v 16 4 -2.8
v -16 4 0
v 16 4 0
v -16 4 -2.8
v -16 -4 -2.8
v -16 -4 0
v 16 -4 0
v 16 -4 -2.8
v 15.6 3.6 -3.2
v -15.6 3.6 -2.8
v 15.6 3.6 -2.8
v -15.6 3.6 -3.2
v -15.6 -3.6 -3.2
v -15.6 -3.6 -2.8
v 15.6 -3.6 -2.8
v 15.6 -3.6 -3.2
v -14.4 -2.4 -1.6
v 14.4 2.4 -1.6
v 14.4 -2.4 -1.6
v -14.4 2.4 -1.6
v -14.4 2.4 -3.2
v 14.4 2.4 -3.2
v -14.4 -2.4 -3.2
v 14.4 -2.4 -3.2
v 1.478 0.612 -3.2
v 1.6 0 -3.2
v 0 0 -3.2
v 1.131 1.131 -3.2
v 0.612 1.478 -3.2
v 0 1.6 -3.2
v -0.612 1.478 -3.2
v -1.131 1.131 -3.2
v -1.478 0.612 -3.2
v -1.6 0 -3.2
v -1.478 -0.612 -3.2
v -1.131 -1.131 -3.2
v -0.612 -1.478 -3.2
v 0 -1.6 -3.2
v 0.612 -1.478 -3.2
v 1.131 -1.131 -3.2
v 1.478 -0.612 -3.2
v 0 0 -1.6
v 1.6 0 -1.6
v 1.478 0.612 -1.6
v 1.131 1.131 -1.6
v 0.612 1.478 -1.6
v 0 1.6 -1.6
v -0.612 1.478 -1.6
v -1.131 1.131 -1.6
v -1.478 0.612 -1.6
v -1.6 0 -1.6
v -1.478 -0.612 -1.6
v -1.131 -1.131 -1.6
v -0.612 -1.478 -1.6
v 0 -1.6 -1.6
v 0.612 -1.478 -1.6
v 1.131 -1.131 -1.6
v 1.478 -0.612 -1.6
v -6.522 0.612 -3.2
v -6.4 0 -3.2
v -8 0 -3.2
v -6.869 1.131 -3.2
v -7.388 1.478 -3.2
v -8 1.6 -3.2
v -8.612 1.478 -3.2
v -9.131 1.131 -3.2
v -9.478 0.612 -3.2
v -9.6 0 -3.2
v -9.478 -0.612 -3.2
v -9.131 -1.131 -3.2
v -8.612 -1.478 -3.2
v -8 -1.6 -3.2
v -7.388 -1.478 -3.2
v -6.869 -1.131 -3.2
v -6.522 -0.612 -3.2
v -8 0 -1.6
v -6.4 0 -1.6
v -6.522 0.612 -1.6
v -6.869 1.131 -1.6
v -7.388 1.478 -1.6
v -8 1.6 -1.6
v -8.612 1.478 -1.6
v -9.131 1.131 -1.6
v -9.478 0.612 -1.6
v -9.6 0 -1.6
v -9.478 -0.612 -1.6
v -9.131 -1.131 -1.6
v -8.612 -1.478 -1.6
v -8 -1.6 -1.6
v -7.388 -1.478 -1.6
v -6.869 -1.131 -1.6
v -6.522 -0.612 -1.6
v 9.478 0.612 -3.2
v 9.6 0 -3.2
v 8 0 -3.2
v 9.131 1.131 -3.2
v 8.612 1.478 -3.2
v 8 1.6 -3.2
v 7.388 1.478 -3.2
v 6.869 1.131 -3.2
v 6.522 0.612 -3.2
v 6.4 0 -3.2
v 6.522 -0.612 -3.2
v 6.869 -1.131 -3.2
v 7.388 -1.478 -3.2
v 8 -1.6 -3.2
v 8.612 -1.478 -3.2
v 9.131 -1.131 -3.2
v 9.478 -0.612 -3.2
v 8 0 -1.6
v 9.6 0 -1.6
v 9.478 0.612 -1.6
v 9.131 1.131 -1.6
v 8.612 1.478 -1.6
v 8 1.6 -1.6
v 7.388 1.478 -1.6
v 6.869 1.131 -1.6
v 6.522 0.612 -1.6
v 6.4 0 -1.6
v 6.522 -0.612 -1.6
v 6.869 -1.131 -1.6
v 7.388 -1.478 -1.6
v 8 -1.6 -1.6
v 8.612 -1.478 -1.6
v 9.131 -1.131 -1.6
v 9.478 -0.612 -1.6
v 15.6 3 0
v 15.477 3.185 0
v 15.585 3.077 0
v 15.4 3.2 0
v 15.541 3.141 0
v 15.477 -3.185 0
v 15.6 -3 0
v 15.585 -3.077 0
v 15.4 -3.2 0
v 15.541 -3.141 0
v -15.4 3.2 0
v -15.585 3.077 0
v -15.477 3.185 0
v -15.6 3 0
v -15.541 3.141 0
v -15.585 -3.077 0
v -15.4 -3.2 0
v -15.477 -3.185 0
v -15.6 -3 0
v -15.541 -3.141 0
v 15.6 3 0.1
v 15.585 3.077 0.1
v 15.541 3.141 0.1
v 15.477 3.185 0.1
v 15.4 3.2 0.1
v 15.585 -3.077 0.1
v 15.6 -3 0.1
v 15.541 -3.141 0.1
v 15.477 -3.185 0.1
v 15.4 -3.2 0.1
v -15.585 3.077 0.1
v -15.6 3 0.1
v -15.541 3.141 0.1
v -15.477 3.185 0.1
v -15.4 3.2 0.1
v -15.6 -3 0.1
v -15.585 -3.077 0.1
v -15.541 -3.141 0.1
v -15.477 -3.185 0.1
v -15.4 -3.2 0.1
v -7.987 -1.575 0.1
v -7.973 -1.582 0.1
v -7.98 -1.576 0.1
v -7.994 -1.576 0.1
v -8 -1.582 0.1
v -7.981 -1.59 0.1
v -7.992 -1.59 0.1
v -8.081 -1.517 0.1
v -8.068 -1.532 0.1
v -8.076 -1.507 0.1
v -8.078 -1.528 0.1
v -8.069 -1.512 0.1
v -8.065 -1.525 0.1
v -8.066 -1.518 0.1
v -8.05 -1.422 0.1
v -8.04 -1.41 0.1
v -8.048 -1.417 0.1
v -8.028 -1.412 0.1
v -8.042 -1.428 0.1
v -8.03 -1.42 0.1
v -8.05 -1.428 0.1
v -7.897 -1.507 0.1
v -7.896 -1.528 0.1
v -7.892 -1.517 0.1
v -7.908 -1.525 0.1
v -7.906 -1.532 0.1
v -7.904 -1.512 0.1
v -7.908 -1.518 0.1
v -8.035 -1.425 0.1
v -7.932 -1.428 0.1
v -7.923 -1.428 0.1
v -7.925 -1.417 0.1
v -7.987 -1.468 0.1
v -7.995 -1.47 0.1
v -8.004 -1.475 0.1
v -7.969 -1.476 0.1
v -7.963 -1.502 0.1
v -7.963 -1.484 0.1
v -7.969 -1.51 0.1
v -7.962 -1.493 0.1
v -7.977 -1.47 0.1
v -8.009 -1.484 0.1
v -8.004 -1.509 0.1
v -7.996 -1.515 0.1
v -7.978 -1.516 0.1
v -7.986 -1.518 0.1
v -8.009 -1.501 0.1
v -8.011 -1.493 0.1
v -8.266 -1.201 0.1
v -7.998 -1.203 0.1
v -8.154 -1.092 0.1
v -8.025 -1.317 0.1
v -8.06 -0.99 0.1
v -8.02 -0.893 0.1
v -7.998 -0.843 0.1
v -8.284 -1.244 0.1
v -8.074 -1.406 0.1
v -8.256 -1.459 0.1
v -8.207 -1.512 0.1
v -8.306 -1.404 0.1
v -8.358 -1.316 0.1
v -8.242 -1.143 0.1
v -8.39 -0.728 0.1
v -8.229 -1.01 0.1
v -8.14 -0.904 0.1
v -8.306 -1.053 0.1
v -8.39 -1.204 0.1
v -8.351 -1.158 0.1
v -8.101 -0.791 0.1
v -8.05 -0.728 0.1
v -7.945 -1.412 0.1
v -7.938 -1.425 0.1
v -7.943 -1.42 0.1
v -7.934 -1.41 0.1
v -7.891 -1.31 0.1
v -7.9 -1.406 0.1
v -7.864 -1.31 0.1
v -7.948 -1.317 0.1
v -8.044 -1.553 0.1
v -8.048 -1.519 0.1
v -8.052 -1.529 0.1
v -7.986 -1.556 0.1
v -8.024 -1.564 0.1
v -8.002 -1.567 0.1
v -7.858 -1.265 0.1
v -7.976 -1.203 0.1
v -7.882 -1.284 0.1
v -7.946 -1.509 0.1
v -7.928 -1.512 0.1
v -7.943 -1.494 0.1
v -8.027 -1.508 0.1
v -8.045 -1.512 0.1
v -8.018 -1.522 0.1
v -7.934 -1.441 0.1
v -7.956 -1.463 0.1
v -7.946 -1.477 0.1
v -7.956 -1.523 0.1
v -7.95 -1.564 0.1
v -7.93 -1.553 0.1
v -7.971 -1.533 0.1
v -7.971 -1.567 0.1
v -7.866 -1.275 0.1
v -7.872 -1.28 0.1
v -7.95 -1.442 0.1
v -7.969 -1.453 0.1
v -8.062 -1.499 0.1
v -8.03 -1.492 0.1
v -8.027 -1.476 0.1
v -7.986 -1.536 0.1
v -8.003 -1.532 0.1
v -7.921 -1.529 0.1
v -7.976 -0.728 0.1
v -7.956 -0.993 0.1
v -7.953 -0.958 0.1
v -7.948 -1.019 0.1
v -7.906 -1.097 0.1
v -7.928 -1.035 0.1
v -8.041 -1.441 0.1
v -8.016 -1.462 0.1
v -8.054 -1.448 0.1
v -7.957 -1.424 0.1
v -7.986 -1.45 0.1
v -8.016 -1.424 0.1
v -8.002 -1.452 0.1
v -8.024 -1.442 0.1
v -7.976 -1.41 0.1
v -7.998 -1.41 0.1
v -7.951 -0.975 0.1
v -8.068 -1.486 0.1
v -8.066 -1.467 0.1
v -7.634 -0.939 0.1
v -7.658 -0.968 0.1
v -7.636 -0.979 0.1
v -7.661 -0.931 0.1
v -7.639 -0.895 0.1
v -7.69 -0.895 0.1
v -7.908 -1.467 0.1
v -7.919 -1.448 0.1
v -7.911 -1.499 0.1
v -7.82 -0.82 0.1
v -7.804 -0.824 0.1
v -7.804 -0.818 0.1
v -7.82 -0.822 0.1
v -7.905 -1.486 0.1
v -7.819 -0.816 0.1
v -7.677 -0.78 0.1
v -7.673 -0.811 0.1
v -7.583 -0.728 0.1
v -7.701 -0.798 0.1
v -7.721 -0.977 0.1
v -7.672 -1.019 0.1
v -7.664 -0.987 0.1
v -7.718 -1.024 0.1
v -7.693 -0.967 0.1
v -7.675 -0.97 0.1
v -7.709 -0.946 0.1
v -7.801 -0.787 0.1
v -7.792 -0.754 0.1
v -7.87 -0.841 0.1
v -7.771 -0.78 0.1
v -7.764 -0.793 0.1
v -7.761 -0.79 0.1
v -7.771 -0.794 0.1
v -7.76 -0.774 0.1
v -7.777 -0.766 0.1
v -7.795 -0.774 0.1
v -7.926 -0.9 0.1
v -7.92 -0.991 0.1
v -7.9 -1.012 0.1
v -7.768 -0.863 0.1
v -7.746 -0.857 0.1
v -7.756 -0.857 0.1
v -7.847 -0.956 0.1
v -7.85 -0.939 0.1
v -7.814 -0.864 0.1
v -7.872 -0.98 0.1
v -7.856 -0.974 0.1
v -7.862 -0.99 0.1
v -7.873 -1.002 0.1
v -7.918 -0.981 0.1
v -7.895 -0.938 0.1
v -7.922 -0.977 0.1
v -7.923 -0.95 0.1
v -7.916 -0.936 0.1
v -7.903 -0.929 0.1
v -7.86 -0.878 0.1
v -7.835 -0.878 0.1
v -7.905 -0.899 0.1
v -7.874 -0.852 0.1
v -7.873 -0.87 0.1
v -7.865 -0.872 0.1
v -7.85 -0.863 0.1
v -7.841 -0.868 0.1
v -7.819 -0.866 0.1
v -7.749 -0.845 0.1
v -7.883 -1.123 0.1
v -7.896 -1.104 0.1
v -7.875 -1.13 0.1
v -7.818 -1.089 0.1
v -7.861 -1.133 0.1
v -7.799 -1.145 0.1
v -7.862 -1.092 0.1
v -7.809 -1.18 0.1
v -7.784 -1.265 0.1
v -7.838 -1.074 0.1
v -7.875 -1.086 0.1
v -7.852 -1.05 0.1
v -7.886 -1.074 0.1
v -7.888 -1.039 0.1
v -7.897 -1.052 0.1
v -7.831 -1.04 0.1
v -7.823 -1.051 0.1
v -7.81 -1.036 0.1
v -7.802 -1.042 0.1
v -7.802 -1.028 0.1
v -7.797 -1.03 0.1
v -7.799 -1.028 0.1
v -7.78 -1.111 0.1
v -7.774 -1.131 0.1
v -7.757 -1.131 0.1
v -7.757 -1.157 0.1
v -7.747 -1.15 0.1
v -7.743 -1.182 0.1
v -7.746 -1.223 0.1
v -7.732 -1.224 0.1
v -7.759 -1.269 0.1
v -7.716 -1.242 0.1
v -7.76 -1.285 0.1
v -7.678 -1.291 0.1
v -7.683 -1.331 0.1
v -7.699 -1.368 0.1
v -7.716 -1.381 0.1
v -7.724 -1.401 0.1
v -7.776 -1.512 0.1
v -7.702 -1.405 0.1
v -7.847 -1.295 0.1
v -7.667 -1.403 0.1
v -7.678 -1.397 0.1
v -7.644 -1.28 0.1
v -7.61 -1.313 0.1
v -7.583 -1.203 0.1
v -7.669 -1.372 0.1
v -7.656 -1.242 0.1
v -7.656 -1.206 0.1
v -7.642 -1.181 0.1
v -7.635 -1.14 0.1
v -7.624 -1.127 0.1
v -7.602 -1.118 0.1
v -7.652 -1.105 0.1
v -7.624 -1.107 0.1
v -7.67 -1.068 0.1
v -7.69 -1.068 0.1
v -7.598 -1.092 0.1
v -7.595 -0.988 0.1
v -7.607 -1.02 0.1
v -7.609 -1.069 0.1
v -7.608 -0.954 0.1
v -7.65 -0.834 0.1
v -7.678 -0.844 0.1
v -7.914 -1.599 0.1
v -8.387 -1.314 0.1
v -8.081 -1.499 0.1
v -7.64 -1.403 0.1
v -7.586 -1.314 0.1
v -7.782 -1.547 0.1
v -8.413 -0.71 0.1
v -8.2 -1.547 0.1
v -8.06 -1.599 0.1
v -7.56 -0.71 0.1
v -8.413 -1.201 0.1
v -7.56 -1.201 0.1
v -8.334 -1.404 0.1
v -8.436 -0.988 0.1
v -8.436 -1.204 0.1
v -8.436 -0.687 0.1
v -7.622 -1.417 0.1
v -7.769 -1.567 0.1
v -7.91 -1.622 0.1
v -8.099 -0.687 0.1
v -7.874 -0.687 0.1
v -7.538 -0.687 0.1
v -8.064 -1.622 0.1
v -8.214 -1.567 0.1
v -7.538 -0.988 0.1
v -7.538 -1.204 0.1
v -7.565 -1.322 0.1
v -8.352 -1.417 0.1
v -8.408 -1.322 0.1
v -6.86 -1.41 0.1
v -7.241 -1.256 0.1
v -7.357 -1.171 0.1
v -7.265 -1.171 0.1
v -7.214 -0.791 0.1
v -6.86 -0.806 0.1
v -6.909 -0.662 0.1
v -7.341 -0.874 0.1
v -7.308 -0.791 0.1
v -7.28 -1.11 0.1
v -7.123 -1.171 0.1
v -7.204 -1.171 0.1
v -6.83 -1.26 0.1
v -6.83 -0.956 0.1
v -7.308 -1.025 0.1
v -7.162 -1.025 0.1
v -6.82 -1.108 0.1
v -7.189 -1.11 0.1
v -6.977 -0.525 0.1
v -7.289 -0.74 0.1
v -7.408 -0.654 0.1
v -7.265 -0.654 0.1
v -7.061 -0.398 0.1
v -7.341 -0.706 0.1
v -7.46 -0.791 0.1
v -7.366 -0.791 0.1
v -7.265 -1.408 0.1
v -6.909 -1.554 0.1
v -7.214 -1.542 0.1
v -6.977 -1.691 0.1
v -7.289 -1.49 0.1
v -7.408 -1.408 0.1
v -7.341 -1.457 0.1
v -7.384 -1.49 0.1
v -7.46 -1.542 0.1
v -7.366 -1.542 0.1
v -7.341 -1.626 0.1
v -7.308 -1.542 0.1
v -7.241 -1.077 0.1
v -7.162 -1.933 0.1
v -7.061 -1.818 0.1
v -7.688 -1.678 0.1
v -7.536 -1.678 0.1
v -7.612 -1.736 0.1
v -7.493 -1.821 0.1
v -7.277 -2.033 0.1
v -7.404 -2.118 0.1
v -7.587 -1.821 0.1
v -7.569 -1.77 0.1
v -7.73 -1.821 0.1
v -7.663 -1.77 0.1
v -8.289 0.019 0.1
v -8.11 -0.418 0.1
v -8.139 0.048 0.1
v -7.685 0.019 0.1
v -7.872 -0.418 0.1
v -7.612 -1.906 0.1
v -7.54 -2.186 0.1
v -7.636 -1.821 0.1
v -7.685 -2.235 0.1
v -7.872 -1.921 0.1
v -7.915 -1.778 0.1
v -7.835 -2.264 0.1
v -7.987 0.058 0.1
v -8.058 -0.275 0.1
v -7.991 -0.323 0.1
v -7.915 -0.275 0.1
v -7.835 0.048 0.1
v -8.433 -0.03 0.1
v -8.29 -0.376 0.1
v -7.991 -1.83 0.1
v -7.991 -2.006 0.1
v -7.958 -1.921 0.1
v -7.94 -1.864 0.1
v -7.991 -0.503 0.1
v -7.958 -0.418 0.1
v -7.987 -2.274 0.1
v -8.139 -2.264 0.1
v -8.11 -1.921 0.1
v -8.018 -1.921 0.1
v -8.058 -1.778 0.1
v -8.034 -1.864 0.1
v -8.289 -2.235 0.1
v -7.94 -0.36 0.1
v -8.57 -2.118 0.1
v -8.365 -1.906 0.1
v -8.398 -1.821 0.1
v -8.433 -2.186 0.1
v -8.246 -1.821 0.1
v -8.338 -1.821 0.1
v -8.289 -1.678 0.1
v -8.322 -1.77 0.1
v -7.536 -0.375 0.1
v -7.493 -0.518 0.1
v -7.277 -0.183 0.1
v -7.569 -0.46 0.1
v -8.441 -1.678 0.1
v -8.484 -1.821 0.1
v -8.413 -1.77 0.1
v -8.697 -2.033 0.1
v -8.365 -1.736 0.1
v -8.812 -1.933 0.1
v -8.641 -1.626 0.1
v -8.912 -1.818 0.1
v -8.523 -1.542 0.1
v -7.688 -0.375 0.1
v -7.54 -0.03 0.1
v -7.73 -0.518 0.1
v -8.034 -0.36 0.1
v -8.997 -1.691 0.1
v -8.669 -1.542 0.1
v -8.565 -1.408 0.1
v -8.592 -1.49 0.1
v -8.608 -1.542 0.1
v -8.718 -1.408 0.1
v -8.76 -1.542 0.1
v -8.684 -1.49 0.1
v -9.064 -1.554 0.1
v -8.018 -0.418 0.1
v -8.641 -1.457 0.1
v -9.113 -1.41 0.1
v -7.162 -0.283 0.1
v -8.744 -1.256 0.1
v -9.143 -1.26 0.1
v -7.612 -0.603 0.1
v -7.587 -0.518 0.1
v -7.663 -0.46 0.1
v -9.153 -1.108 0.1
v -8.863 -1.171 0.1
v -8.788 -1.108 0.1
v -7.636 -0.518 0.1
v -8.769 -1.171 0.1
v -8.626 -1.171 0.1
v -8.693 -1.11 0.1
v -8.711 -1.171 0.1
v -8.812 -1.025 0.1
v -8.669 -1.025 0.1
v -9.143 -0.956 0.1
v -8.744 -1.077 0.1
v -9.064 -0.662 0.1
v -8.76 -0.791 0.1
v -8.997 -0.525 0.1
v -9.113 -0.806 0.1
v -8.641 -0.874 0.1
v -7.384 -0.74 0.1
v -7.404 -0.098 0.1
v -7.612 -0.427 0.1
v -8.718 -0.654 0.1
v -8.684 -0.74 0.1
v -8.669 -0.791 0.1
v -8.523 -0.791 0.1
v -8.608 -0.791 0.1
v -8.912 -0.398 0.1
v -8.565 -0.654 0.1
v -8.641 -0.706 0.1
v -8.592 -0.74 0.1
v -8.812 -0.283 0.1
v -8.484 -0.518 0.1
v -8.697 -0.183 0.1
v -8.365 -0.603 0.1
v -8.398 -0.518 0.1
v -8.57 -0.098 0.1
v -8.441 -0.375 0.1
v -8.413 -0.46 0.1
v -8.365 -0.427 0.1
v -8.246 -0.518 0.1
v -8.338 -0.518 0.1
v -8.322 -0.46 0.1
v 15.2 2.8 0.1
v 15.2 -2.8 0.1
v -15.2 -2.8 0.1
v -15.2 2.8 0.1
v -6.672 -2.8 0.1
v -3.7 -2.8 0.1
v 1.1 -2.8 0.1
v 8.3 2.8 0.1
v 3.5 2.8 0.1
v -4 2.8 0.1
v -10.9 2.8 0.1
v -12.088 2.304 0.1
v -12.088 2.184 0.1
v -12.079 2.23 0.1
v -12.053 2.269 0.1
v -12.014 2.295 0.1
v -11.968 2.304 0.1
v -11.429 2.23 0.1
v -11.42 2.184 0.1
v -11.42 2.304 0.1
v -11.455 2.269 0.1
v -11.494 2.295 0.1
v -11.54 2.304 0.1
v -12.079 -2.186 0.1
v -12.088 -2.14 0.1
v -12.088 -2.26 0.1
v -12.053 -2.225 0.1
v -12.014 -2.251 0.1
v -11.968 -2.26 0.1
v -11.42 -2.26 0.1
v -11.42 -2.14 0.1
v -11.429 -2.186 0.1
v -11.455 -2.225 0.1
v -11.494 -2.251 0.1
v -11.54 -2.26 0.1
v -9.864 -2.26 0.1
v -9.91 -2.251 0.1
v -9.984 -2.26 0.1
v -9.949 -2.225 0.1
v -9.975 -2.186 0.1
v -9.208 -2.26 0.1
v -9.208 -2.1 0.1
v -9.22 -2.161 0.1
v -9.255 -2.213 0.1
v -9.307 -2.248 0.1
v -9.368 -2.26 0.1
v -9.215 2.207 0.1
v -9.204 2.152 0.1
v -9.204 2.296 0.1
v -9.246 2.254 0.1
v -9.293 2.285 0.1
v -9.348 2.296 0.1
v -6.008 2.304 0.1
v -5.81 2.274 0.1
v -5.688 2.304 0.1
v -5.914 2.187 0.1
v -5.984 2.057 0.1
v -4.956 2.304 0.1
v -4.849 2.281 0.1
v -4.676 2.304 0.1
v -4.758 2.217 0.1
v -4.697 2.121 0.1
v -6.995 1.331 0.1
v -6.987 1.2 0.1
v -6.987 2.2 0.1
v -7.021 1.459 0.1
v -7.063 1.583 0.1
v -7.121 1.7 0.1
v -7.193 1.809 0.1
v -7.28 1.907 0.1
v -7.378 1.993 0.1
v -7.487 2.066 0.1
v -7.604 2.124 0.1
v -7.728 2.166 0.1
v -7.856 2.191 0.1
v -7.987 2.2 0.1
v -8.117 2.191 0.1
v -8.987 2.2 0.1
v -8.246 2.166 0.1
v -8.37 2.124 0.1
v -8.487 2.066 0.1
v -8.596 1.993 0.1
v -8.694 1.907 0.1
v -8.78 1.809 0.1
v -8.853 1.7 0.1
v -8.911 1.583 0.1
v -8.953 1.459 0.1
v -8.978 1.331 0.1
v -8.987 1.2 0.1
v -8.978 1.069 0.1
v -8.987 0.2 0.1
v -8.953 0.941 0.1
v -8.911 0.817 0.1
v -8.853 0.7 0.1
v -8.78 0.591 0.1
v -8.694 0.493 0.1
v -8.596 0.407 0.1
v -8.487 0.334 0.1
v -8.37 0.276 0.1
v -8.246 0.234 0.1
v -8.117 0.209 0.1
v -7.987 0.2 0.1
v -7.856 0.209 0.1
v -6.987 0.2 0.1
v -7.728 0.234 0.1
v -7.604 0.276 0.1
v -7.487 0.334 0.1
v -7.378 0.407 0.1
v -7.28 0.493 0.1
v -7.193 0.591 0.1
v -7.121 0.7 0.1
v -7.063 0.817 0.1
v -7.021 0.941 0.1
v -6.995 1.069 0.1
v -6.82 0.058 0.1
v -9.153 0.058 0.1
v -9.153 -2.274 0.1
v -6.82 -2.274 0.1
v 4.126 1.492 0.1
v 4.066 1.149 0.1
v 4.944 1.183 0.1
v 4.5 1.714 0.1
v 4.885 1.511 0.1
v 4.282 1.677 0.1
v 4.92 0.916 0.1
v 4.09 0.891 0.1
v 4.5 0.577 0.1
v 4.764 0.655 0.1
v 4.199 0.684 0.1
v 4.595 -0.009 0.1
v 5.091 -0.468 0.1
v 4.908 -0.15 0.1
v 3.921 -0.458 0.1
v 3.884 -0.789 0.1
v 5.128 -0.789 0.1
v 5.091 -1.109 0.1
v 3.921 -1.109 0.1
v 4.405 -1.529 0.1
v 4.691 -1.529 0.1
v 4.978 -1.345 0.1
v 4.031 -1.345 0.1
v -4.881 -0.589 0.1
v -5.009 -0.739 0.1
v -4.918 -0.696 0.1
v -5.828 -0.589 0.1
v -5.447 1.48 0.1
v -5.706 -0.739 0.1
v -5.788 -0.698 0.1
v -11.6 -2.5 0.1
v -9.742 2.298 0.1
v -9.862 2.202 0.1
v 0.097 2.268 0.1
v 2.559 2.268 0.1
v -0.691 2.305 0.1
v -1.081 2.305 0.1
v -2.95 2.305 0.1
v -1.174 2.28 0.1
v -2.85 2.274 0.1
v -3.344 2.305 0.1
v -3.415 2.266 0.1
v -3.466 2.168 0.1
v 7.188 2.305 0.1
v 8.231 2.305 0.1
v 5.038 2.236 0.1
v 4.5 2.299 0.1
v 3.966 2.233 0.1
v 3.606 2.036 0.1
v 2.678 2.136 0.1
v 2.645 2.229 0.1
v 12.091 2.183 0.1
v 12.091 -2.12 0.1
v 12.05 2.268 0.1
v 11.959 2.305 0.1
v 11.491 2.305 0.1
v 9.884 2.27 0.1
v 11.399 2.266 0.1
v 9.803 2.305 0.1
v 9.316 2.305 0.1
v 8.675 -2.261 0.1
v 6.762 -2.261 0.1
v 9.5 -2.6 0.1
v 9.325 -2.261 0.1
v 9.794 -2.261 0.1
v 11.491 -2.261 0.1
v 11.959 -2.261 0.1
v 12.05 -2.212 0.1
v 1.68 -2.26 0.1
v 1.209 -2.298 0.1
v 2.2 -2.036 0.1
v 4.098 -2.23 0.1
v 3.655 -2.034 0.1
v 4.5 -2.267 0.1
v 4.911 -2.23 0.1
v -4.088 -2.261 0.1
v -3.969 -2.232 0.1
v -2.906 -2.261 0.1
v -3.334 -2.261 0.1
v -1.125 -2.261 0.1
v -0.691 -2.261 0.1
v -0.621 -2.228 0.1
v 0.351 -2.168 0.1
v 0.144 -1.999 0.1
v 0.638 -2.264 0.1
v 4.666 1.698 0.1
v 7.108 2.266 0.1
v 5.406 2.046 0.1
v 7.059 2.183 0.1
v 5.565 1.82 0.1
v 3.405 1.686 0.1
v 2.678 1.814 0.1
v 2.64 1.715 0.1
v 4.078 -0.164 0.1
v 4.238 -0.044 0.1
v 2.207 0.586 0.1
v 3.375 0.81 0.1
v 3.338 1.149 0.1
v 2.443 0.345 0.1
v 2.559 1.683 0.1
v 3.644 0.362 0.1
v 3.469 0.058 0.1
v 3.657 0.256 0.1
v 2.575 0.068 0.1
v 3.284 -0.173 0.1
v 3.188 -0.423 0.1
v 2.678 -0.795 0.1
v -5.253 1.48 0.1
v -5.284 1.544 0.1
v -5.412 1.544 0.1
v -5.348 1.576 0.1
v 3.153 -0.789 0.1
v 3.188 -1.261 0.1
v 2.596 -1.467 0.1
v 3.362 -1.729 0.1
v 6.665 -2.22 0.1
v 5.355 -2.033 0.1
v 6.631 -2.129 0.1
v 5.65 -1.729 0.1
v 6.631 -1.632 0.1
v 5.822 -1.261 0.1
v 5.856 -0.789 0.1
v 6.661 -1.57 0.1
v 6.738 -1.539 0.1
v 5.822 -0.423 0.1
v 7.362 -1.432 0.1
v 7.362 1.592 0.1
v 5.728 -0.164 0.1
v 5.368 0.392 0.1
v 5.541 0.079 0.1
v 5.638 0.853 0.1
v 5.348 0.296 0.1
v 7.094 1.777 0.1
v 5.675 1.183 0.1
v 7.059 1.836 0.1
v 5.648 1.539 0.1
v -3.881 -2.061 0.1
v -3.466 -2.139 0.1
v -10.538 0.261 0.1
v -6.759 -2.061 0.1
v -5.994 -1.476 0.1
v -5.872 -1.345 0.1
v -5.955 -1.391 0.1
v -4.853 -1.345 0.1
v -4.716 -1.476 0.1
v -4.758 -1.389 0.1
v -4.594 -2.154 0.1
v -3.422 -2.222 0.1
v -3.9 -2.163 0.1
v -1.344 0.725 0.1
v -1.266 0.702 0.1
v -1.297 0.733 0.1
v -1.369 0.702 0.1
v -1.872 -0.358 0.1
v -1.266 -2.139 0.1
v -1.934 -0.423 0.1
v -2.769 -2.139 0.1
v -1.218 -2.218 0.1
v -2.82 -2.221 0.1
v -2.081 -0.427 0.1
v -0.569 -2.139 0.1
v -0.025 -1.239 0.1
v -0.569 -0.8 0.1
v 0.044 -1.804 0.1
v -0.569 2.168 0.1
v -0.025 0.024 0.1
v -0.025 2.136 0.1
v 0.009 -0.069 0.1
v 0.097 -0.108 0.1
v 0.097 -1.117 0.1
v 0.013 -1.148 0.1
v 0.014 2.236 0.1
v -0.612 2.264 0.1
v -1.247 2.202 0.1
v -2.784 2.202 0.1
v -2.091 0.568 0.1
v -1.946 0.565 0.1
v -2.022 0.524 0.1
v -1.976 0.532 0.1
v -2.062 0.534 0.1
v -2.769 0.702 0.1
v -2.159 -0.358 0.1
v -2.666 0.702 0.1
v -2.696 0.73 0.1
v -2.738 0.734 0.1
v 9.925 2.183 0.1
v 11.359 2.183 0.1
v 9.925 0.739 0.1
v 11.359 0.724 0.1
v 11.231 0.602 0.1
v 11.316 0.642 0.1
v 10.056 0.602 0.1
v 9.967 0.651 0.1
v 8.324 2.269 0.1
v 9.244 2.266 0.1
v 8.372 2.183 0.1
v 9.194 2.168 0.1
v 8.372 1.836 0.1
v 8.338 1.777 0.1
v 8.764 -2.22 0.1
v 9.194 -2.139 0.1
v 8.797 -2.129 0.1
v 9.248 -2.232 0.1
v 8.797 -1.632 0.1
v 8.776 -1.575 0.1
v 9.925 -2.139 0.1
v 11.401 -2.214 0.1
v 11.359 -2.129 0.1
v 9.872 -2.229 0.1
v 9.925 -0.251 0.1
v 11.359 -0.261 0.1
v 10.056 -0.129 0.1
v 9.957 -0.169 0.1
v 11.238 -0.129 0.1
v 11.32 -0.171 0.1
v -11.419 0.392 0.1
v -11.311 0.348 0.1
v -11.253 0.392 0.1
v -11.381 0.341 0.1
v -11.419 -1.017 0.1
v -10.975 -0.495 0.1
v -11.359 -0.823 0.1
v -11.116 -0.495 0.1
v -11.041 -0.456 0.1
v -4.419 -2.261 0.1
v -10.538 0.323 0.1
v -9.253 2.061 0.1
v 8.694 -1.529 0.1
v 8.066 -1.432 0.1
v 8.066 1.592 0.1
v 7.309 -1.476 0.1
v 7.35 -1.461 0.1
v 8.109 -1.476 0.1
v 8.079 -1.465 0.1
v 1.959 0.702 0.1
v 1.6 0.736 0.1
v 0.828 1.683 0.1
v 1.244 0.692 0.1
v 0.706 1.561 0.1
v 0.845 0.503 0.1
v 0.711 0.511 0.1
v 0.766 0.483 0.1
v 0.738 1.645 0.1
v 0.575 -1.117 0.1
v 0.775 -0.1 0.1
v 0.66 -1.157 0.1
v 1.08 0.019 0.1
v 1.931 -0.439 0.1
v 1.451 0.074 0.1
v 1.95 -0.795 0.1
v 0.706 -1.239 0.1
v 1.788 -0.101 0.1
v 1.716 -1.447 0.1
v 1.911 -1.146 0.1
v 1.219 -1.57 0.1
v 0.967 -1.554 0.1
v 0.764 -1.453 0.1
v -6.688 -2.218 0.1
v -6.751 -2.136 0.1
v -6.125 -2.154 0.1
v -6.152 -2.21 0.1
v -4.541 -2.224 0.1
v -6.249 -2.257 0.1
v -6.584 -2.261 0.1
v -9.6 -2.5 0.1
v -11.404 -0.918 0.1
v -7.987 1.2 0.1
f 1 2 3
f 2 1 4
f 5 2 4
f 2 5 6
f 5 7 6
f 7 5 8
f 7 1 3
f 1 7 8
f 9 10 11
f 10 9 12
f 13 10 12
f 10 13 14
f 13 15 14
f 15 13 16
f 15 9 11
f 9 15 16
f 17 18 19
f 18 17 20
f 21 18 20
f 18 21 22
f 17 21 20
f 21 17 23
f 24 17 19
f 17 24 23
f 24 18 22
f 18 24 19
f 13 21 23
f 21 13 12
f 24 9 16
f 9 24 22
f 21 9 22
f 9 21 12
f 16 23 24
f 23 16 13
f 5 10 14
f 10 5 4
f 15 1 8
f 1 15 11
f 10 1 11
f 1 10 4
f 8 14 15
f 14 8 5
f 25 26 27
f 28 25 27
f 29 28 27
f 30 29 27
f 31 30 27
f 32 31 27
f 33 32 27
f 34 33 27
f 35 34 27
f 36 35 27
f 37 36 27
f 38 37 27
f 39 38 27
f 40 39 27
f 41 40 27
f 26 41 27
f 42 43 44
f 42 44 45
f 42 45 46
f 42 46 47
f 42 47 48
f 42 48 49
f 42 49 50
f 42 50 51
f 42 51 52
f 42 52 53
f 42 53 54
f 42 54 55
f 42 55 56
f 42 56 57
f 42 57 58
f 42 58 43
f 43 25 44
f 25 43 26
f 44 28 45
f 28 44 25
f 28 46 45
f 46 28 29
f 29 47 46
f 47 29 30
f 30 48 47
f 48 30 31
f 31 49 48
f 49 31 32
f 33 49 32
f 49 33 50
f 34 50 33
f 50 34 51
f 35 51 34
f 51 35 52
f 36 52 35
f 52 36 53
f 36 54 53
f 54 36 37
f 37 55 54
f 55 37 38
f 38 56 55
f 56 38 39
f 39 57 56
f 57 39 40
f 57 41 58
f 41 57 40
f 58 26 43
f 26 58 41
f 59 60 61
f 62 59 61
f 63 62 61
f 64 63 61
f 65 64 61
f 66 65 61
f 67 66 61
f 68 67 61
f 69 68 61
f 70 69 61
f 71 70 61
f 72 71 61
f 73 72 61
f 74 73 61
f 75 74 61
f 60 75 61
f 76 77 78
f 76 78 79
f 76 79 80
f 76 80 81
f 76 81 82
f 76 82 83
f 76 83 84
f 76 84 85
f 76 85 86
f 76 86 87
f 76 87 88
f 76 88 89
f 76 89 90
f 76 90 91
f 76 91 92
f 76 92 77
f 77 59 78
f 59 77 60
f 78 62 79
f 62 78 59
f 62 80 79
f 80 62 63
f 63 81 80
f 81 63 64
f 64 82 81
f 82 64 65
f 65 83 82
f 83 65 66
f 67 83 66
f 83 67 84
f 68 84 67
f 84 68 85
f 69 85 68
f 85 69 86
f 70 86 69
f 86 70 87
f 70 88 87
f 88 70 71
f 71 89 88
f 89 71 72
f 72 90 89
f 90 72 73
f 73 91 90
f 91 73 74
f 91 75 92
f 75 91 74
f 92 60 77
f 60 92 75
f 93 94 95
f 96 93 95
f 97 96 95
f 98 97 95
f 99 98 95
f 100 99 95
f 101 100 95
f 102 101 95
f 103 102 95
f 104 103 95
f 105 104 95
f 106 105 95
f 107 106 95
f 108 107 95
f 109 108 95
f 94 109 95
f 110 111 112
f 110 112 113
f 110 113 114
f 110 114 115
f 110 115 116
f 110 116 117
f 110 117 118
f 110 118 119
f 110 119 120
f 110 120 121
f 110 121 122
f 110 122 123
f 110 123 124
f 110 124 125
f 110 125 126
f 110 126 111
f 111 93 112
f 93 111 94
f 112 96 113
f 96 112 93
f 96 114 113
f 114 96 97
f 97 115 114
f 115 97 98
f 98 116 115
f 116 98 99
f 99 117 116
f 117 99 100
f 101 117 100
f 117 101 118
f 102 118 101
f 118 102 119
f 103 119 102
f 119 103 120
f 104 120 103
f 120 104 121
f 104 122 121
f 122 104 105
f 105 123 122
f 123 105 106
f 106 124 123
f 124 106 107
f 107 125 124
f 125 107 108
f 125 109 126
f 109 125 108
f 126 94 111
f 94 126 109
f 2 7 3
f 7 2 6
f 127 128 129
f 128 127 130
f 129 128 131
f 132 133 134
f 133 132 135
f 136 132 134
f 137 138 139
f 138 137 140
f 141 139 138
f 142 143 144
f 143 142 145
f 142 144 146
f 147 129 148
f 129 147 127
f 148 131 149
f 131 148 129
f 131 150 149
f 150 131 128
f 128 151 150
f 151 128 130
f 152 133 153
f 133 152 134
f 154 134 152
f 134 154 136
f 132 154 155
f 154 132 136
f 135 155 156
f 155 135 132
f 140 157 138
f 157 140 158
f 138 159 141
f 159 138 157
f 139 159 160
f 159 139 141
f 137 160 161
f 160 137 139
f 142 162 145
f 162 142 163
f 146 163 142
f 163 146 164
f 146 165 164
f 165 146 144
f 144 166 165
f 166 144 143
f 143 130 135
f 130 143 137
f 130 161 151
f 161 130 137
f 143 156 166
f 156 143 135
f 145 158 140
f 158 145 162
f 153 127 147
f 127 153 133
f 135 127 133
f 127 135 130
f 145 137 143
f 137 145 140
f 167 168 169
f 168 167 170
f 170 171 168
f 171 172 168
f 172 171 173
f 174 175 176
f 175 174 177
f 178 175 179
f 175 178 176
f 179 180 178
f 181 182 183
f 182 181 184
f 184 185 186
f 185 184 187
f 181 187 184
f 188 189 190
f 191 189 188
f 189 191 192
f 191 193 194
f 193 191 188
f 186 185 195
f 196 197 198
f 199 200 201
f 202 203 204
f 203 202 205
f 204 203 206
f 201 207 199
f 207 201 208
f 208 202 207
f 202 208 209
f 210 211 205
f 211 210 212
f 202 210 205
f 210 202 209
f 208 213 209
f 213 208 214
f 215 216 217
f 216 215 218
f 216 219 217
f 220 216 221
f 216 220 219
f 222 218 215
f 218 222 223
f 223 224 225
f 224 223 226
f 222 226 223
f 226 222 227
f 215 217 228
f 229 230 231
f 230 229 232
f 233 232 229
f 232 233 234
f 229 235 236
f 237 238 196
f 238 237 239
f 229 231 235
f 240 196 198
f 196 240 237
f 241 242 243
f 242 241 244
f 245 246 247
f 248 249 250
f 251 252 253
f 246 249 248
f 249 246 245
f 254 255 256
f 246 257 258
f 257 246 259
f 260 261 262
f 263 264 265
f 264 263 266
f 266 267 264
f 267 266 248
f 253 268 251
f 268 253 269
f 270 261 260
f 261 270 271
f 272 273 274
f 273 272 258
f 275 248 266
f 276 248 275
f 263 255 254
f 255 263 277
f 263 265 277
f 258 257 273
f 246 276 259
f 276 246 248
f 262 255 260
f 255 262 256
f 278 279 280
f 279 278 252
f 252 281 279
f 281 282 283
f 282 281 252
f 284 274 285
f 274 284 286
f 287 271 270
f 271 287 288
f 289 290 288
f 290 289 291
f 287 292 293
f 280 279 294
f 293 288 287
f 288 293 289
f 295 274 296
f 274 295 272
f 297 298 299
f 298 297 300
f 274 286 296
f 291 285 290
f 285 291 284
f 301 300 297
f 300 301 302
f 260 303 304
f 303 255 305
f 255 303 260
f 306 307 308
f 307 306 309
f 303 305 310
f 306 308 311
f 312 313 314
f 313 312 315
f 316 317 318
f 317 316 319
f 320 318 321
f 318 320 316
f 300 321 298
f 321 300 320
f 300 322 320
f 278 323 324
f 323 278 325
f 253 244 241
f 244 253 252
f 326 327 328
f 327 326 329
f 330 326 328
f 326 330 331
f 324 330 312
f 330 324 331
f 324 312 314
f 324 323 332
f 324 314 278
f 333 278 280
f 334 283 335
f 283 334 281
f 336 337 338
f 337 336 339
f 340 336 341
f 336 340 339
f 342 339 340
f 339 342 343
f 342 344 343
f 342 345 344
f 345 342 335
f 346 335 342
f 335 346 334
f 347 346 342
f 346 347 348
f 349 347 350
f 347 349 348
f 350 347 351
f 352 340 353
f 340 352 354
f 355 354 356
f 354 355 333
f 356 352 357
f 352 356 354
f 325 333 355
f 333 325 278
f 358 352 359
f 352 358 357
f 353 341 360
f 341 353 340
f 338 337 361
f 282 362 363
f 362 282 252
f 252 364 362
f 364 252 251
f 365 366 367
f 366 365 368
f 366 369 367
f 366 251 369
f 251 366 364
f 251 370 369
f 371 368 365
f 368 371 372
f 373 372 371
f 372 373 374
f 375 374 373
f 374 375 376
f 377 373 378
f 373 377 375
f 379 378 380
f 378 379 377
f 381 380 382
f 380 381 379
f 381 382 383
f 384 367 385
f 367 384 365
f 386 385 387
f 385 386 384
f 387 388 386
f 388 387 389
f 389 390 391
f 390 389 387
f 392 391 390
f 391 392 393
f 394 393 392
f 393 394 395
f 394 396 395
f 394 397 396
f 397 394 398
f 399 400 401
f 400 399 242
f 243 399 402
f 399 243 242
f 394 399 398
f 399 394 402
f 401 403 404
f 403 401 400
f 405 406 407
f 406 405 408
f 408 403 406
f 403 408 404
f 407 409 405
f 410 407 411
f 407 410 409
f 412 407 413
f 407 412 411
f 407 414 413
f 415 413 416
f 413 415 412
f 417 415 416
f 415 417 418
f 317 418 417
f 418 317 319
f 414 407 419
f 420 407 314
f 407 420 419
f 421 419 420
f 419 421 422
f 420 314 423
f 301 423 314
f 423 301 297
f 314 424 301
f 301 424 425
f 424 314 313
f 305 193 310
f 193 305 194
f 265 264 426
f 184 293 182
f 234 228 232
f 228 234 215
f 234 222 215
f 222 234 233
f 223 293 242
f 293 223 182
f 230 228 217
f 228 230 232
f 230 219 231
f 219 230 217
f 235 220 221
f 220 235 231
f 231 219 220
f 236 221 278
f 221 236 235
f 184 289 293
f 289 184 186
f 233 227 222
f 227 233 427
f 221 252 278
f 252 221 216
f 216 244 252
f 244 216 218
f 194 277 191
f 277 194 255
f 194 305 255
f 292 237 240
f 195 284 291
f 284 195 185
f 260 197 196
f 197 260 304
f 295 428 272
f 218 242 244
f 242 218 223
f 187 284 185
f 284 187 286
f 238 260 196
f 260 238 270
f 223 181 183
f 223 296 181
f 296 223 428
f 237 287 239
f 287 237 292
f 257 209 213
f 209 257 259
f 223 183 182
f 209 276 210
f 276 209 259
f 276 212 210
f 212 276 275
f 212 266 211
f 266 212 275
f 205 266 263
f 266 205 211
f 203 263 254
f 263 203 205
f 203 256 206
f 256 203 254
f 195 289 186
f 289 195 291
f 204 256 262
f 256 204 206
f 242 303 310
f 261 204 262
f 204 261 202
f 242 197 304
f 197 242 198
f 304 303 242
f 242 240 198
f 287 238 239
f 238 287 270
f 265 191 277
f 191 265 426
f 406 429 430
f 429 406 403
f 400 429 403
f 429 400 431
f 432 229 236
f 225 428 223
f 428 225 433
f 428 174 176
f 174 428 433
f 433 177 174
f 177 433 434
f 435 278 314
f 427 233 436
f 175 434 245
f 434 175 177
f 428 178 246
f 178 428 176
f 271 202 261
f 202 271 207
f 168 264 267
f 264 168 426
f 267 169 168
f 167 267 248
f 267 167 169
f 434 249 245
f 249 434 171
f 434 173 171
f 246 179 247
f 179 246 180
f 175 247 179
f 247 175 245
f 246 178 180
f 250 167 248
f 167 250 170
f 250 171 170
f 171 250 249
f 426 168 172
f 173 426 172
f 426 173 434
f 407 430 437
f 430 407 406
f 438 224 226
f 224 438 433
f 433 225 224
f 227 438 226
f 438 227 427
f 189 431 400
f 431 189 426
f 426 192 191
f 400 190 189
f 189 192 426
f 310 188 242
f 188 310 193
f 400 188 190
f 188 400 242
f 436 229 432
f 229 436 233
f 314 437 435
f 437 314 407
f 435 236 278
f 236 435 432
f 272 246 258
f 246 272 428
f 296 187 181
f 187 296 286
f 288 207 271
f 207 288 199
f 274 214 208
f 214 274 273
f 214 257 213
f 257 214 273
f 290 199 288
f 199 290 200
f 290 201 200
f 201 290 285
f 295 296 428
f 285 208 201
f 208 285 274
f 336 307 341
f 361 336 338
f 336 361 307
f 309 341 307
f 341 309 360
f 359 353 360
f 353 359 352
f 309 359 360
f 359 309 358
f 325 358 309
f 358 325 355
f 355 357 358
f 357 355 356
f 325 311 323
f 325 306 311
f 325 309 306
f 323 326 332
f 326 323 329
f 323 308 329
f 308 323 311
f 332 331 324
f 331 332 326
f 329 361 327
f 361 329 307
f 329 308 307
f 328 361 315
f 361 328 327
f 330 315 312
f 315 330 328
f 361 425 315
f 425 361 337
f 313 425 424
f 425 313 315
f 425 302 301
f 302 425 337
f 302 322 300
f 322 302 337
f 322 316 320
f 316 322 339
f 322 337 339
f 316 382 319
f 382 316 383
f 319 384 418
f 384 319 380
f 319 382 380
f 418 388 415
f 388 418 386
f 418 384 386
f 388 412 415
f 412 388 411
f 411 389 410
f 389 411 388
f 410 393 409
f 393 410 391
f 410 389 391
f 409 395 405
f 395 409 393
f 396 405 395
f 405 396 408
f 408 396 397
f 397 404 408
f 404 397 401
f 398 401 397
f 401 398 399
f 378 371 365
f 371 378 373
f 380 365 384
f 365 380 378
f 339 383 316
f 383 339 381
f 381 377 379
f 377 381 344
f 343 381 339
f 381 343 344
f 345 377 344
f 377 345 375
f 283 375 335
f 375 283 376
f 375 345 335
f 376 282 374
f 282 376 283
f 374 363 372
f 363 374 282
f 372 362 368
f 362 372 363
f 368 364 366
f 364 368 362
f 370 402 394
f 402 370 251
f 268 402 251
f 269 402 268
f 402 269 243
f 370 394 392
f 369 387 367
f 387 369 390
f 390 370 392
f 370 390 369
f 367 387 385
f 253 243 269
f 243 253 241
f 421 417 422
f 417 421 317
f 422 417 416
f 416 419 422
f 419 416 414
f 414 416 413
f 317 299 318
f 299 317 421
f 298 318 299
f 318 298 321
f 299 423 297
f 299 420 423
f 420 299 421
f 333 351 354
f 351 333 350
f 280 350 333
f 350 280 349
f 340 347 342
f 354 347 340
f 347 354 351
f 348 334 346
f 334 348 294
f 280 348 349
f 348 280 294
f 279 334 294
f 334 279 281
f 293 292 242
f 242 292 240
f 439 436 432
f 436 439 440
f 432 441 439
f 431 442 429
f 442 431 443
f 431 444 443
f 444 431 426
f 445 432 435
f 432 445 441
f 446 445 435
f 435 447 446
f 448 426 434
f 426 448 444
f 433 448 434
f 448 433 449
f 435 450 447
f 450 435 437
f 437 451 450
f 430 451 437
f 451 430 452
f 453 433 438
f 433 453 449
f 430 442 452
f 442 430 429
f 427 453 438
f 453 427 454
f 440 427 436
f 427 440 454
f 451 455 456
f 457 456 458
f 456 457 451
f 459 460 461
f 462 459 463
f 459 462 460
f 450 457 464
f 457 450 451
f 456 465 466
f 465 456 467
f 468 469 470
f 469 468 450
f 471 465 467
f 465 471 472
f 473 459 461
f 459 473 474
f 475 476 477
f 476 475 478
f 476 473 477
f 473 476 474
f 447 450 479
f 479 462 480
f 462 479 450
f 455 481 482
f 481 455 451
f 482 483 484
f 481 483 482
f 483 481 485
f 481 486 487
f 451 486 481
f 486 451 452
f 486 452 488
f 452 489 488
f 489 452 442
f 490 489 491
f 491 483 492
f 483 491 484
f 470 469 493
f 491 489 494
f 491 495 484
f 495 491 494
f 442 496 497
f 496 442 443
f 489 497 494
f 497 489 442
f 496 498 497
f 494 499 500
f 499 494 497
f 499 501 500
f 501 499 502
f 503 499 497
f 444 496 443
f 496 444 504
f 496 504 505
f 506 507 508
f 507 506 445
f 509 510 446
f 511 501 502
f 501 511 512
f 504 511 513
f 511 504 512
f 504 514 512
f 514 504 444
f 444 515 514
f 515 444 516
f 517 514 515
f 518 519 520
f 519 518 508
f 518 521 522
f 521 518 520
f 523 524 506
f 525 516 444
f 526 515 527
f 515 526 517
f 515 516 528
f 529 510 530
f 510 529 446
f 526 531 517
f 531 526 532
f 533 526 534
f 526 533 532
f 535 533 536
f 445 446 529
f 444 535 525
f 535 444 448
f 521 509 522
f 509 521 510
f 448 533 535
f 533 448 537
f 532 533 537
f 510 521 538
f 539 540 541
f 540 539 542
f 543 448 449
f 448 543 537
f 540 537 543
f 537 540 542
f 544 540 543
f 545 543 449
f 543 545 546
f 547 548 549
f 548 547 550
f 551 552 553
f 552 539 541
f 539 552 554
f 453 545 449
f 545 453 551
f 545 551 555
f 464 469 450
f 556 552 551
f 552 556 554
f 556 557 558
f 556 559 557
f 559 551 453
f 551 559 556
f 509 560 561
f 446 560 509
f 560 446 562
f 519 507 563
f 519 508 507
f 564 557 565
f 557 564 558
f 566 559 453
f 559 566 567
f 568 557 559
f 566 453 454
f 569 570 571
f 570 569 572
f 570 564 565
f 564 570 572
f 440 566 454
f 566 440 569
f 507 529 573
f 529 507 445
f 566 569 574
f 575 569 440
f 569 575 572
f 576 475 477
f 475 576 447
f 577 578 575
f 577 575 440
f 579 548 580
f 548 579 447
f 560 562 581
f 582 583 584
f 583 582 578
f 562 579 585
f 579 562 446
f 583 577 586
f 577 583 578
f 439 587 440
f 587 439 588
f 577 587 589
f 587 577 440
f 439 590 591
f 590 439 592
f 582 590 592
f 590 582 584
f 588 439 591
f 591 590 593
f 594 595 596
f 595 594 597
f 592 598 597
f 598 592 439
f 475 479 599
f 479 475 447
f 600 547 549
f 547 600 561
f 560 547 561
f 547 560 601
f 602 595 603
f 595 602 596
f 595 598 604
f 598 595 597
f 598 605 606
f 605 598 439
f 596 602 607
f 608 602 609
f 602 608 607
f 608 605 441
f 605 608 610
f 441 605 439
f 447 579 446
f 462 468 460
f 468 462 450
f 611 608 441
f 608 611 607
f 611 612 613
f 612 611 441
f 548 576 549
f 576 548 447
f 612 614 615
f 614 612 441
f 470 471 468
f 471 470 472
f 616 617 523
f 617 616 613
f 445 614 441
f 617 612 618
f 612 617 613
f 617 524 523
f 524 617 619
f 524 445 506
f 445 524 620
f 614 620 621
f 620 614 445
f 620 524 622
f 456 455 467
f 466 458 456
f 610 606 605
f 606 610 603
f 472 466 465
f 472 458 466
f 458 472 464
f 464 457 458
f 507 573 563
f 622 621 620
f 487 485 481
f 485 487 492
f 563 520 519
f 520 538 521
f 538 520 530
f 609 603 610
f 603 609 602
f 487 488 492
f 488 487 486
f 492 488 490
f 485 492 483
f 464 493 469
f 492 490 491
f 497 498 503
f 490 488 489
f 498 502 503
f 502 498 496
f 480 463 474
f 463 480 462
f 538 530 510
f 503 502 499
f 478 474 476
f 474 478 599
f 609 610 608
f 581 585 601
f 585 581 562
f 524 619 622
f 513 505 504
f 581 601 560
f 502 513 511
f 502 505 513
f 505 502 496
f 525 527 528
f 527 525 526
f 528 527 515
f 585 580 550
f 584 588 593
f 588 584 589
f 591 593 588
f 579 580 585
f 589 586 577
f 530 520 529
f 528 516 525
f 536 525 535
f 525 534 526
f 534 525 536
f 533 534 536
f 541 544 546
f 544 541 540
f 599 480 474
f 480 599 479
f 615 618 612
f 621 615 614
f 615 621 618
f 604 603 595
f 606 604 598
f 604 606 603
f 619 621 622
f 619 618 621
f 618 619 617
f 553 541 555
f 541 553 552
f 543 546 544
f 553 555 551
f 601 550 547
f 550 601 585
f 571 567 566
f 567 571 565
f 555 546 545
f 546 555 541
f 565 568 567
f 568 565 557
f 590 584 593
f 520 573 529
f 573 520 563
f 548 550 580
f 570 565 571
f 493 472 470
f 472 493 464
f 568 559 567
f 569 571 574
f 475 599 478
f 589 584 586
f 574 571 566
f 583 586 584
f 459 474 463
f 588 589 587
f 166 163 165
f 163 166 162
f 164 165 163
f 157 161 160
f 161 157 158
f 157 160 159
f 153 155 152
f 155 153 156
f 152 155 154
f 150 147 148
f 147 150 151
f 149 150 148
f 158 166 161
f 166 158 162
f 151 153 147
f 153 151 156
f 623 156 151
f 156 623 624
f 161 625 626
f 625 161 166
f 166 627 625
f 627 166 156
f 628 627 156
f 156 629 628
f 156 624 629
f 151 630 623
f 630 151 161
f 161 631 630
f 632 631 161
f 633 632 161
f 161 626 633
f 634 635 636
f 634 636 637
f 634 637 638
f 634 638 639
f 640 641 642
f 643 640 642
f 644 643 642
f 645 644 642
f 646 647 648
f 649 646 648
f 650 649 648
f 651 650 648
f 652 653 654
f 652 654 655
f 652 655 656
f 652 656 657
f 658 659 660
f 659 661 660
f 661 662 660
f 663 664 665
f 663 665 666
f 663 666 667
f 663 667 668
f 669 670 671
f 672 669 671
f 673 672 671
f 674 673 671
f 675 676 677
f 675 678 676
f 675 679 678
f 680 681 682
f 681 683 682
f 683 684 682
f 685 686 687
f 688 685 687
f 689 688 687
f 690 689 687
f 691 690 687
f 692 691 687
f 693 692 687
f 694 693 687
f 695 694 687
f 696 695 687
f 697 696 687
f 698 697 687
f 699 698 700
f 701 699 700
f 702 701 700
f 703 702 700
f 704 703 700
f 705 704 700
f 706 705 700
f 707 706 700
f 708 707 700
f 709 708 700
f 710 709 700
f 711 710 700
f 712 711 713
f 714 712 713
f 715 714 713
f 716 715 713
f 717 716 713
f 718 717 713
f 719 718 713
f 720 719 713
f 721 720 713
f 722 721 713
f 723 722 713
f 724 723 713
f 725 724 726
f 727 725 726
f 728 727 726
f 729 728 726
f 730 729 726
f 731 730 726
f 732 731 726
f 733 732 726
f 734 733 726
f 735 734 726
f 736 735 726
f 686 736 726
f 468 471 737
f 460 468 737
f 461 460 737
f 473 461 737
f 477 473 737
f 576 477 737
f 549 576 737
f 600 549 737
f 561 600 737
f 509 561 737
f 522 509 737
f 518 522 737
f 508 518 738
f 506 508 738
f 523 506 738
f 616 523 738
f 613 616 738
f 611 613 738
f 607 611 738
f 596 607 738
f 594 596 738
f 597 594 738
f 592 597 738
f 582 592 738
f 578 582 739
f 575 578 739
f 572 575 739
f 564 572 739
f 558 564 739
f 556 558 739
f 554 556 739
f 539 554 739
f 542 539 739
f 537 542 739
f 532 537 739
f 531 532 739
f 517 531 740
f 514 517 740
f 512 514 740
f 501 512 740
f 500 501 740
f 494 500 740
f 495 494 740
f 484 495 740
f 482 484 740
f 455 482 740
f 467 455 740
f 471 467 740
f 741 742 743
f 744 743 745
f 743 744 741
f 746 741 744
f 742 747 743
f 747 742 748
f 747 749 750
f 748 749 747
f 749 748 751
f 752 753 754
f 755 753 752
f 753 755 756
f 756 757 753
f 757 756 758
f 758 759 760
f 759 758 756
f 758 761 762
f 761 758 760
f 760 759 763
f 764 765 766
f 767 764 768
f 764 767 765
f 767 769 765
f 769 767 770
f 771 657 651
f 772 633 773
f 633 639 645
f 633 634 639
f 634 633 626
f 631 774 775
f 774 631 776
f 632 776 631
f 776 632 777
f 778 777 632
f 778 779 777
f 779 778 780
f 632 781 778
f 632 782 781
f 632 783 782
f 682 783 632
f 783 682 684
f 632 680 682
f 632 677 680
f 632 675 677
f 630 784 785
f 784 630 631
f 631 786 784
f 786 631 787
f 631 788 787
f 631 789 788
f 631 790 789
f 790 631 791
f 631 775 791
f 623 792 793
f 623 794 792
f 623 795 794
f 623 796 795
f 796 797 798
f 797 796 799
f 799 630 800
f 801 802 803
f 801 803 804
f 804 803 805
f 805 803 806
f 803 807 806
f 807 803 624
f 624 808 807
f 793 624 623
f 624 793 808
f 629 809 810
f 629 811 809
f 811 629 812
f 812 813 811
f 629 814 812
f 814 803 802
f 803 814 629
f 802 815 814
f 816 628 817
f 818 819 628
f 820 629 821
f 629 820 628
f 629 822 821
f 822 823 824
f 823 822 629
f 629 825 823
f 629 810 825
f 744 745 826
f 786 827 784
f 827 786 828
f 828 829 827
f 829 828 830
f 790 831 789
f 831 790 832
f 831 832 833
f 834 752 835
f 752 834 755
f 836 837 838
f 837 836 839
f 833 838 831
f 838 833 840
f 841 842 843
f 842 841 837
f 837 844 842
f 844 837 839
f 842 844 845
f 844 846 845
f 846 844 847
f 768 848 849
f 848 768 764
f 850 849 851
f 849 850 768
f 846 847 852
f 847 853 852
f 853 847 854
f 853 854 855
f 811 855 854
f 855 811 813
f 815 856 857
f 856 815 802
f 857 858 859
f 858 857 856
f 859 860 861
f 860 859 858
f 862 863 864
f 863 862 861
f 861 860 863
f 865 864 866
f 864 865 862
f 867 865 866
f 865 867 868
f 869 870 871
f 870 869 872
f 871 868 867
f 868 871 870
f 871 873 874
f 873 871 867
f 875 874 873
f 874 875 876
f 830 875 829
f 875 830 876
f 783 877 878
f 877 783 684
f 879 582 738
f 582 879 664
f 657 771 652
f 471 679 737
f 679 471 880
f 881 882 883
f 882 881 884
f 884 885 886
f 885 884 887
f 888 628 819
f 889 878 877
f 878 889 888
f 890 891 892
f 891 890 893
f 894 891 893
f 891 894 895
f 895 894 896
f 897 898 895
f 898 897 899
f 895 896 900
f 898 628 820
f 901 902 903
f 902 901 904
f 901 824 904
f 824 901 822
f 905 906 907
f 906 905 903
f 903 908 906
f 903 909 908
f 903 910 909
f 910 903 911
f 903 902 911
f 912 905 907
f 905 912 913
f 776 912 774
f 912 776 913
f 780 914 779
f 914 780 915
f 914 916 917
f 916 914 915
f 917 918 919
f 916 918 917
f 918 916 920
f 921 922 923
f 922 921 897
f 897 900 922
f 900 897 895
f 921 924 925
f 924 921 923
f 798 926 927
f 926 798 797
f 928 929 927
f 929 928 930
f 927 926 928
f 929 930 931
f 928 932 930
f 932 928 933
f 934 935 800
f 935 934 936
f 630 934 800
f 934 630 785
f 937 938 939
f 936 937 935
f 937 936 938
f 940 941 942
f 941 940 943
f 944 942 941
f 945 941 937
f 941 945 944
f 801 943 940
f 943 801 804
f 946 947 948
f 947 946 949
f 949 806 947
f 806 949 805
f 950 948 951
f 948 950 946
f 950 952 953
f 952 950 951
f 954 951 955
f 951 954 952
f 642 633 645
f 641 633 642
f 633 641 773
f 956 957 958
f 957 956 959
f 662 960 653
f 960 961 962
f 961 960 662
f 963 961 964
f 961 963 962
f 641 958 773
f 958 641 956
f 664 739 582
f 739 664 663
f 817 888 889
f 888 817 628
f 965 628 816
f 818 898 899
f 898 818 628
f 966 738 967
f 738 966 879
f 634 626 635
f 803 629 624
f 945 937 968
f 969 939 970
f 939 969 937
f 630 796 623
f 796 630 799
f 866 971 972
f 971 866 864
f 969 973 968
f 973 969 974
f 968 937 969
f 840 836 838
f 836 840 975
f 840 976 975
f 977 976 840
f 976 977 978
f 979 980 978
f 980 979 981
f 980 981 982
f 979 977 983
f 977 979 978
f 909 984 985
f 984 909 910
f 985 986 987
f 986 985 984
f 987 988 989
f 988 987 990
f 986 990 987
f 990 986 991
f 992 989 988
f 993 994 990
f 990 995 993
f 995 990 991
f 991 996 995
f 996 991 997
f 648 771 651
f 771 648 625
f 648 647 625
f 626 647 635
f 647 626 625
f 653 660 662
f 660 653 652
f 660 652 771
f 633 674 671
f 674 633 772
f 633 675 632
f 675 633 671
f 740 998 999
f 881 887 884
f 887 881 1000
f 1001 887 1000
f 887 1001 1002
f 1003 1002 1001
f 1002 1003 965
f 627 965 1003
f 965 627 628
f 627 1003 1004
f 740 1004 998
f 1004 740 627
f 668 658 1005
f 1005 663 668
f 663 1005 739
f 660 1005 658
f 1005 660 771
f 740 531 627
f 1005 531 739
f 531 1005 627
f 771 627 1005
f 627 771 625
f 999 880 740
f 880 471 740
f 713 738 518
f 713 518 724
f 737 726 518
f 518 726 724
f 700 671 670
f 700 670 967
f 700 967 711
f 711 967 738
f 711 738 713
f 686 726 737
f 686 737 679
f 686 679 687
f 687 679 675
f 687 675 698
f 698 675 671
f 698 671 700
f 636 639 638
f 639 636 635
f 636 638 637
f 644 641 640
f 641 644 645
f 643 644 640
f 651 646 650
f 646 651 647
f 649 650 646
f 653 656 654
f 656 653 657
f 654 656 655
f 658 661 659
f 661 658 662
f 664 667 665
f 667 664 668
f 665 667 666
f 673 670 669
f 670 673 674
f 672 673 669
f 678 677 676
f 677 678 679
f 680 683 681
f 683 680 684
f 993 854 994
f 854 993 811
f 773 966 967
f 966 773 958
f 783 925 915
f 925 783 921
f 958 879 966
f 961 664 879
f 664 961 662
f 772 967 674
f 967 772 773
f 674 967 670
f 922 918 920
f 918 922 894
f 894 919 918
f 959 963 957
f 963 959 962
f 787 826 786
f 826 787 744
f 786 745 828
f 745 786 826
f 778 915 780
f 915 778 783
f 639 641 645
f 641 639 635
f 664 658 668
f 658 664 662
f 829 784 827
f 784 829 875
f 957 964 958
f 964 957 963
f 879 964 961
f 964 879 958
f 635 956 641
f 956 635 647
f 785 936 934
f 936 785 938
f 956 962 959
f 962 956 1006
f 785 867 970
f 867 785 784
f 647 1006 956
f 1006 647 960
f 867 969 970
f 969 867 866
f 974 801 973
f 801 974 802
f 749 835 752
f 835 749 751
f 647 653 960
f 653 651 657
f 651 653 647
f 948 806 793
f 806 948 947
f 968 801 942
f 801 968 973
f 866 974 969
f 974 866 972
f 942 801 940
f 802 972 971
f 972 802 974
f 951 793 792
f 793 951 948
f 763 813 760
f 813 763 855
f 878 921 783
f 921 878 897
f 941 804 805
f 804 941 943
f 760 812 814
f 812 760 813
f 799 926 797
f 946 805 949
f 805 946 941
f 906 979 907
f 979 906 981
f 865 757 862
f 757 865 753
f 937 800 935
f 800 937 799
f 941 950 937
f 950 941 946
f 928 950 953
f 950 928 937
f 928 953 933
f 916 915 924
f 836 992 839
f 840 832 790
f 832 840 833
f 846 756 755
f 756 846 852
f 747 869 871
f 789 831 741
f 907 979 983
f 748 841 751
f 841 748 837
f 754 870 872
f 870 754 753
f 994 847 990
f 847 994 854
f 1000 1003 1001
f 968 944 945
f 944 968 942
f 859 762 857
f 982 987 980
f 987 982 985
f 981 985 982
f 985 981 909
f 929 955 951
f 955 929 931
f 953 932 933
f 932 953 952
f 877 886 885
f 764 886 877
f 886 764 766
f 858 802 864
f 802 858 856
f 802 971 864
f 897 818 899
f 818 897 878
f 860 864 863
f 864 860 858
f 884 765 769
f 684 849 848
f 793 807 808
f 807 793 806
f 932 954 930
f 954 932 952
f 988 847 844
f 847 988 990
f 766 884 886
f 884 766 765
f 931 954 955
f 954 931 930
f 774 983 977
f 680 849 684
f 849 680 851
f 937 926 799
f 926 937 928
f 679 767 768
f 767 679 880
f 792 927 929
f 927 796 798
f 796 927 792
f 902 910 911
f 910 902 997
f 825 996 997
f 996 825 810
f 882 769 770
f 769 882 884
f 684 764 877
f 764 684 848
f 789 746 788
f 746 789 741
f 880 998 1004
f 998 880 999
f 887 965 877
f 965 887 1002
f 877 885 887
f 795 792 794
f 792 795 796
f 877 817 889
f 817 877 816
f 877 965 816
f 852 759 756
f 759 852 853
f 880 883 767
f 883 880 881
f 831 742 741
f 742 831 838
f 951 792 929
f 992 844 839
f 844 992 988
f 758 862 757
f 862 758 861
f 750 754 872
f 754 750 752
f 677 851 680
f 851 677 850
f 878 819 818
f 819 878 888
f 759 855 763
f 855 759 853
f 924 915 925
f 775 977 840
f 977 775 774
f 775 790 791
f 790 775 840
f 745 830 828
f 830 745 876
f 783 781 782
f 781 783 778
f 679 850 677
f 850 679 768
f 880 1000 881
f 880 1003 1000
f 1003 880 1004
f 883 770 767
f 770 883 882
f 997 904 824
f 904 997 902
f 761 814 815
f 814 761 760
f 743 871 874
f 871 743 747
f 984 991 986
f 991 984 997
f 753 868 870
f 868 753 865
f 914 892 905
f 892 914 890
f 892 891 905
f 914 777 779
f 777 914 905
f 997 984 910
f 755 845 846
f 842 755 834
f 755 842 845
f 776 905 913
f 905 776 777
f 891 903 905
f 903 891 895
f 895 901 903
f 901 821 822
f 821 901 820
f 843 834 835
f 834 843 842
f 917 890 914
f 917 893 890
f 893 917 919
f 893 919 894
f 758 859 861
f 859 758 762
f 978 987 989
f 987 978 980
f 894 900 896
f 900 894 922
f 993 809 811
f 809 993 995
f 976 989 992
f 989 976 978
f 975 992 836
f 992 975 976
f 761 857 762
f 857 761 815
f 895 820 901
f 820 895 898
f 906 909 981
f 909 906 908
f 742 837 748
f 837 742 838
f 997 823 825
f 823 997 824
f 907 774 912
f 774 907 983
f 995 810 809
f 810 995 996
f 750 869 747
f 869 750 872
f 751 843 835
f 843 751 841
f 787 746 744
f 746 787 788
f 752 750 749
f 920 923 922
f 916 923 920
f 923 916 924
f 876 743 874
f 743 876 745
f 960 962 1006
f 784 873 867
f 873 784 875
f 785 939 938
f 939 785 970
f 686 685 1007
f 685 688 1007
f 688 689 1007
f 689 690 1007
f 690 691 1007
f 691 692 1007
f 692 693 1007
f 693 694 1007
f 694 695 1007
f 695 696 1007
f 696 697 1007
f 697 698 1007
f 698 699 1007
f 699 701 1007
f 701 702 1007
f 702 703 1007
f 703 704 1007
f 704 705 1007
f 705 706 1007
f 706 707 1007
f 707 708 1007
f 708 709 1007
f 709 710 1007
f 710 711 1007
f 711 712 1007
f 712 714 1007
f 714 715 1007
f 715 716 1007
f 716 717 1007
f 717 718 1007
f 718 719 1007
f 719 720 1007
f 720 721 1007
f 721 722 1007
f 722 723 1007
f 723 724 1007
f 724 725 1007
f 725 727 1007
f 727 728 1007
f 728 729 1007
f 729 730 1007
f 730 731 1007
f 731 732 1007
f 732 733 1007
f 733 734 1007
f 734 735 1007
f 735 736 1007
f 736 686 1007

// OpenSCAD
use <../lib.scad>
use <2431.scad>
use <6258203h.scad>
function ldraw_lib__2431dt2() = [
// 0 Tile  1 x  4 with German Front License Plate "K AM58IH" Sticker
// 0 Name: 2431dt2.dat
// 0 Author: Ulrich Röder [UR]
// 0 !LDRAW_ORG Shortcut UPDATE 2024-04
// 0 !LICENSE Licensed under CC BY 4.0 : see CAreadme.txt
// 
// 0 BFC CERTIFY CCW
  [0,"BFC","CERTIFY"],
  [0,"BFC","CCW"],
// 
// 0 !CATEGORY Sticker Shortcut
// 0 !KEYWORDS Ford, Mustang, Set 10265
// 
// 0 !HISTORY 2019-06-28 [PTadmin] Official Update 2019-01
// 0 !HISTORY 2024-05-27 [OrionP] Change category to Sticker Shortcut
// 0 !HISTORY 2024-05-28 [OrionP] Official Update 2024-04
// 
// 
// 1 16 0 0 0 1 0 0 0 1 0 0 0 1 2431.dat
  [1,16,0,0,0,1,0,0,0,1,0,0,0,1, ldraw_lib__2431()],
// 1 16 0 0 0 1 0 0 0 1 0 0 0 1 6258203h.dat
  [1,16,0,0,0,1,0,0,0,1,0,0,0,1, ldraw_lib__6258203h()],
];
module ldraw_lib__2431dt2(step=0, col=false, unit=2/5, alt=false, line=0.2, solid=!$preview)
    makepoly(ldraw_lib__2431dt2(), step=step, col=col, unit=unit, alt=alt, line=line, solid=solid);
ldraw_lib__2431dt2(line=0.2);
